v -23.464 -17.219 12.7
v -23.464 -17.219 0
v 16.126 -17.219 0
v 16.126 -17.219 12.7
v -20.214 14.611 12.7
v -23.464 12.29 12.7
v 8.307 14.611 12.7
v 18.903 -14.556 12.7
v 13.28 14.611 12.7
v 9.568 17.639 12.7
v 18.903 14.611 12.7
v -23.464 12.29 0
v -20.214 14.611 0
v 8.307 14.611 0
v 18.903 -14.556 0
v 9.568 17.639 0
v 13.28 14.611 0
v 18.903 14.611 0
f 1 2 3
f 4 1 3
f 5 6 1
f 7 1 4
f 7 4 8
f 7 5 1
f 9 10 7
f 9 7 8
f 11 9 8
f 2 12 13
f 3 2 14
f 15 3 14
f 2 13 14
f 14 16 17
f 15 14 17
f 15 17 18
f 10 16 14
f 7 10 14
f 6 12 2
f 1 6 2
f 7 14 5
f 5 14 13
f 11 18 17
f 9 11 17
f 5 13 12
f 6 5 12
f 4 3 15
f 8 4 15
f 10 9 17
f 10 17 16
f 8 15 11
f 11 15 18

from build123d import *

# Parameters (mm, degrees)
F1_DEPTH = 12.7


with BuildPart() as f1:
    # F0 (on Top) → F1 (new body)
    with BuildSketch(Plane.XY):
        Polygon((8.306665788, 14.6107980981), (-20.214330405, 14.6107980981), (-20.214330405, -14.5559702069), (18.9034491777, -14.5559702069), (18.9034491777, 14.6107980981), (13.2803532164, 14.6107980981), (16.125800088, 12.2895119712), (9.568403475, -5.3119254299), (3.5286939237, 3.1436665449), align=None)
        Polygon((-20.214330405, -14.5559702069), (-20.214330405, 14.6107980981), (-23.4641304458, 12.2895119712), (-23.4641304458, -17.2187797725), align=None)
        Polygon((9.568403475, 17.6389683038), (8.306665788, 14.6107980981), (13.2803532164, 14.6107980981), align=None)
        Polygon((13.2803532164, 14.6107980981), (8.306665788, 14.6107980981), (3.5286939237, 3.1436665449), (9.568403475, -5.3119254299), (16.125800088, 12.2895119712), align=None)
        Polygon((18.9034491777, -14.5559702069), (-20.214330405, -14.5559702069), (-23.4641304458, -17.2187797725), (16.125800088, -17.2187797725), align=None)
    extrude(amount=F1_DEPTH)


solid = f1.part
